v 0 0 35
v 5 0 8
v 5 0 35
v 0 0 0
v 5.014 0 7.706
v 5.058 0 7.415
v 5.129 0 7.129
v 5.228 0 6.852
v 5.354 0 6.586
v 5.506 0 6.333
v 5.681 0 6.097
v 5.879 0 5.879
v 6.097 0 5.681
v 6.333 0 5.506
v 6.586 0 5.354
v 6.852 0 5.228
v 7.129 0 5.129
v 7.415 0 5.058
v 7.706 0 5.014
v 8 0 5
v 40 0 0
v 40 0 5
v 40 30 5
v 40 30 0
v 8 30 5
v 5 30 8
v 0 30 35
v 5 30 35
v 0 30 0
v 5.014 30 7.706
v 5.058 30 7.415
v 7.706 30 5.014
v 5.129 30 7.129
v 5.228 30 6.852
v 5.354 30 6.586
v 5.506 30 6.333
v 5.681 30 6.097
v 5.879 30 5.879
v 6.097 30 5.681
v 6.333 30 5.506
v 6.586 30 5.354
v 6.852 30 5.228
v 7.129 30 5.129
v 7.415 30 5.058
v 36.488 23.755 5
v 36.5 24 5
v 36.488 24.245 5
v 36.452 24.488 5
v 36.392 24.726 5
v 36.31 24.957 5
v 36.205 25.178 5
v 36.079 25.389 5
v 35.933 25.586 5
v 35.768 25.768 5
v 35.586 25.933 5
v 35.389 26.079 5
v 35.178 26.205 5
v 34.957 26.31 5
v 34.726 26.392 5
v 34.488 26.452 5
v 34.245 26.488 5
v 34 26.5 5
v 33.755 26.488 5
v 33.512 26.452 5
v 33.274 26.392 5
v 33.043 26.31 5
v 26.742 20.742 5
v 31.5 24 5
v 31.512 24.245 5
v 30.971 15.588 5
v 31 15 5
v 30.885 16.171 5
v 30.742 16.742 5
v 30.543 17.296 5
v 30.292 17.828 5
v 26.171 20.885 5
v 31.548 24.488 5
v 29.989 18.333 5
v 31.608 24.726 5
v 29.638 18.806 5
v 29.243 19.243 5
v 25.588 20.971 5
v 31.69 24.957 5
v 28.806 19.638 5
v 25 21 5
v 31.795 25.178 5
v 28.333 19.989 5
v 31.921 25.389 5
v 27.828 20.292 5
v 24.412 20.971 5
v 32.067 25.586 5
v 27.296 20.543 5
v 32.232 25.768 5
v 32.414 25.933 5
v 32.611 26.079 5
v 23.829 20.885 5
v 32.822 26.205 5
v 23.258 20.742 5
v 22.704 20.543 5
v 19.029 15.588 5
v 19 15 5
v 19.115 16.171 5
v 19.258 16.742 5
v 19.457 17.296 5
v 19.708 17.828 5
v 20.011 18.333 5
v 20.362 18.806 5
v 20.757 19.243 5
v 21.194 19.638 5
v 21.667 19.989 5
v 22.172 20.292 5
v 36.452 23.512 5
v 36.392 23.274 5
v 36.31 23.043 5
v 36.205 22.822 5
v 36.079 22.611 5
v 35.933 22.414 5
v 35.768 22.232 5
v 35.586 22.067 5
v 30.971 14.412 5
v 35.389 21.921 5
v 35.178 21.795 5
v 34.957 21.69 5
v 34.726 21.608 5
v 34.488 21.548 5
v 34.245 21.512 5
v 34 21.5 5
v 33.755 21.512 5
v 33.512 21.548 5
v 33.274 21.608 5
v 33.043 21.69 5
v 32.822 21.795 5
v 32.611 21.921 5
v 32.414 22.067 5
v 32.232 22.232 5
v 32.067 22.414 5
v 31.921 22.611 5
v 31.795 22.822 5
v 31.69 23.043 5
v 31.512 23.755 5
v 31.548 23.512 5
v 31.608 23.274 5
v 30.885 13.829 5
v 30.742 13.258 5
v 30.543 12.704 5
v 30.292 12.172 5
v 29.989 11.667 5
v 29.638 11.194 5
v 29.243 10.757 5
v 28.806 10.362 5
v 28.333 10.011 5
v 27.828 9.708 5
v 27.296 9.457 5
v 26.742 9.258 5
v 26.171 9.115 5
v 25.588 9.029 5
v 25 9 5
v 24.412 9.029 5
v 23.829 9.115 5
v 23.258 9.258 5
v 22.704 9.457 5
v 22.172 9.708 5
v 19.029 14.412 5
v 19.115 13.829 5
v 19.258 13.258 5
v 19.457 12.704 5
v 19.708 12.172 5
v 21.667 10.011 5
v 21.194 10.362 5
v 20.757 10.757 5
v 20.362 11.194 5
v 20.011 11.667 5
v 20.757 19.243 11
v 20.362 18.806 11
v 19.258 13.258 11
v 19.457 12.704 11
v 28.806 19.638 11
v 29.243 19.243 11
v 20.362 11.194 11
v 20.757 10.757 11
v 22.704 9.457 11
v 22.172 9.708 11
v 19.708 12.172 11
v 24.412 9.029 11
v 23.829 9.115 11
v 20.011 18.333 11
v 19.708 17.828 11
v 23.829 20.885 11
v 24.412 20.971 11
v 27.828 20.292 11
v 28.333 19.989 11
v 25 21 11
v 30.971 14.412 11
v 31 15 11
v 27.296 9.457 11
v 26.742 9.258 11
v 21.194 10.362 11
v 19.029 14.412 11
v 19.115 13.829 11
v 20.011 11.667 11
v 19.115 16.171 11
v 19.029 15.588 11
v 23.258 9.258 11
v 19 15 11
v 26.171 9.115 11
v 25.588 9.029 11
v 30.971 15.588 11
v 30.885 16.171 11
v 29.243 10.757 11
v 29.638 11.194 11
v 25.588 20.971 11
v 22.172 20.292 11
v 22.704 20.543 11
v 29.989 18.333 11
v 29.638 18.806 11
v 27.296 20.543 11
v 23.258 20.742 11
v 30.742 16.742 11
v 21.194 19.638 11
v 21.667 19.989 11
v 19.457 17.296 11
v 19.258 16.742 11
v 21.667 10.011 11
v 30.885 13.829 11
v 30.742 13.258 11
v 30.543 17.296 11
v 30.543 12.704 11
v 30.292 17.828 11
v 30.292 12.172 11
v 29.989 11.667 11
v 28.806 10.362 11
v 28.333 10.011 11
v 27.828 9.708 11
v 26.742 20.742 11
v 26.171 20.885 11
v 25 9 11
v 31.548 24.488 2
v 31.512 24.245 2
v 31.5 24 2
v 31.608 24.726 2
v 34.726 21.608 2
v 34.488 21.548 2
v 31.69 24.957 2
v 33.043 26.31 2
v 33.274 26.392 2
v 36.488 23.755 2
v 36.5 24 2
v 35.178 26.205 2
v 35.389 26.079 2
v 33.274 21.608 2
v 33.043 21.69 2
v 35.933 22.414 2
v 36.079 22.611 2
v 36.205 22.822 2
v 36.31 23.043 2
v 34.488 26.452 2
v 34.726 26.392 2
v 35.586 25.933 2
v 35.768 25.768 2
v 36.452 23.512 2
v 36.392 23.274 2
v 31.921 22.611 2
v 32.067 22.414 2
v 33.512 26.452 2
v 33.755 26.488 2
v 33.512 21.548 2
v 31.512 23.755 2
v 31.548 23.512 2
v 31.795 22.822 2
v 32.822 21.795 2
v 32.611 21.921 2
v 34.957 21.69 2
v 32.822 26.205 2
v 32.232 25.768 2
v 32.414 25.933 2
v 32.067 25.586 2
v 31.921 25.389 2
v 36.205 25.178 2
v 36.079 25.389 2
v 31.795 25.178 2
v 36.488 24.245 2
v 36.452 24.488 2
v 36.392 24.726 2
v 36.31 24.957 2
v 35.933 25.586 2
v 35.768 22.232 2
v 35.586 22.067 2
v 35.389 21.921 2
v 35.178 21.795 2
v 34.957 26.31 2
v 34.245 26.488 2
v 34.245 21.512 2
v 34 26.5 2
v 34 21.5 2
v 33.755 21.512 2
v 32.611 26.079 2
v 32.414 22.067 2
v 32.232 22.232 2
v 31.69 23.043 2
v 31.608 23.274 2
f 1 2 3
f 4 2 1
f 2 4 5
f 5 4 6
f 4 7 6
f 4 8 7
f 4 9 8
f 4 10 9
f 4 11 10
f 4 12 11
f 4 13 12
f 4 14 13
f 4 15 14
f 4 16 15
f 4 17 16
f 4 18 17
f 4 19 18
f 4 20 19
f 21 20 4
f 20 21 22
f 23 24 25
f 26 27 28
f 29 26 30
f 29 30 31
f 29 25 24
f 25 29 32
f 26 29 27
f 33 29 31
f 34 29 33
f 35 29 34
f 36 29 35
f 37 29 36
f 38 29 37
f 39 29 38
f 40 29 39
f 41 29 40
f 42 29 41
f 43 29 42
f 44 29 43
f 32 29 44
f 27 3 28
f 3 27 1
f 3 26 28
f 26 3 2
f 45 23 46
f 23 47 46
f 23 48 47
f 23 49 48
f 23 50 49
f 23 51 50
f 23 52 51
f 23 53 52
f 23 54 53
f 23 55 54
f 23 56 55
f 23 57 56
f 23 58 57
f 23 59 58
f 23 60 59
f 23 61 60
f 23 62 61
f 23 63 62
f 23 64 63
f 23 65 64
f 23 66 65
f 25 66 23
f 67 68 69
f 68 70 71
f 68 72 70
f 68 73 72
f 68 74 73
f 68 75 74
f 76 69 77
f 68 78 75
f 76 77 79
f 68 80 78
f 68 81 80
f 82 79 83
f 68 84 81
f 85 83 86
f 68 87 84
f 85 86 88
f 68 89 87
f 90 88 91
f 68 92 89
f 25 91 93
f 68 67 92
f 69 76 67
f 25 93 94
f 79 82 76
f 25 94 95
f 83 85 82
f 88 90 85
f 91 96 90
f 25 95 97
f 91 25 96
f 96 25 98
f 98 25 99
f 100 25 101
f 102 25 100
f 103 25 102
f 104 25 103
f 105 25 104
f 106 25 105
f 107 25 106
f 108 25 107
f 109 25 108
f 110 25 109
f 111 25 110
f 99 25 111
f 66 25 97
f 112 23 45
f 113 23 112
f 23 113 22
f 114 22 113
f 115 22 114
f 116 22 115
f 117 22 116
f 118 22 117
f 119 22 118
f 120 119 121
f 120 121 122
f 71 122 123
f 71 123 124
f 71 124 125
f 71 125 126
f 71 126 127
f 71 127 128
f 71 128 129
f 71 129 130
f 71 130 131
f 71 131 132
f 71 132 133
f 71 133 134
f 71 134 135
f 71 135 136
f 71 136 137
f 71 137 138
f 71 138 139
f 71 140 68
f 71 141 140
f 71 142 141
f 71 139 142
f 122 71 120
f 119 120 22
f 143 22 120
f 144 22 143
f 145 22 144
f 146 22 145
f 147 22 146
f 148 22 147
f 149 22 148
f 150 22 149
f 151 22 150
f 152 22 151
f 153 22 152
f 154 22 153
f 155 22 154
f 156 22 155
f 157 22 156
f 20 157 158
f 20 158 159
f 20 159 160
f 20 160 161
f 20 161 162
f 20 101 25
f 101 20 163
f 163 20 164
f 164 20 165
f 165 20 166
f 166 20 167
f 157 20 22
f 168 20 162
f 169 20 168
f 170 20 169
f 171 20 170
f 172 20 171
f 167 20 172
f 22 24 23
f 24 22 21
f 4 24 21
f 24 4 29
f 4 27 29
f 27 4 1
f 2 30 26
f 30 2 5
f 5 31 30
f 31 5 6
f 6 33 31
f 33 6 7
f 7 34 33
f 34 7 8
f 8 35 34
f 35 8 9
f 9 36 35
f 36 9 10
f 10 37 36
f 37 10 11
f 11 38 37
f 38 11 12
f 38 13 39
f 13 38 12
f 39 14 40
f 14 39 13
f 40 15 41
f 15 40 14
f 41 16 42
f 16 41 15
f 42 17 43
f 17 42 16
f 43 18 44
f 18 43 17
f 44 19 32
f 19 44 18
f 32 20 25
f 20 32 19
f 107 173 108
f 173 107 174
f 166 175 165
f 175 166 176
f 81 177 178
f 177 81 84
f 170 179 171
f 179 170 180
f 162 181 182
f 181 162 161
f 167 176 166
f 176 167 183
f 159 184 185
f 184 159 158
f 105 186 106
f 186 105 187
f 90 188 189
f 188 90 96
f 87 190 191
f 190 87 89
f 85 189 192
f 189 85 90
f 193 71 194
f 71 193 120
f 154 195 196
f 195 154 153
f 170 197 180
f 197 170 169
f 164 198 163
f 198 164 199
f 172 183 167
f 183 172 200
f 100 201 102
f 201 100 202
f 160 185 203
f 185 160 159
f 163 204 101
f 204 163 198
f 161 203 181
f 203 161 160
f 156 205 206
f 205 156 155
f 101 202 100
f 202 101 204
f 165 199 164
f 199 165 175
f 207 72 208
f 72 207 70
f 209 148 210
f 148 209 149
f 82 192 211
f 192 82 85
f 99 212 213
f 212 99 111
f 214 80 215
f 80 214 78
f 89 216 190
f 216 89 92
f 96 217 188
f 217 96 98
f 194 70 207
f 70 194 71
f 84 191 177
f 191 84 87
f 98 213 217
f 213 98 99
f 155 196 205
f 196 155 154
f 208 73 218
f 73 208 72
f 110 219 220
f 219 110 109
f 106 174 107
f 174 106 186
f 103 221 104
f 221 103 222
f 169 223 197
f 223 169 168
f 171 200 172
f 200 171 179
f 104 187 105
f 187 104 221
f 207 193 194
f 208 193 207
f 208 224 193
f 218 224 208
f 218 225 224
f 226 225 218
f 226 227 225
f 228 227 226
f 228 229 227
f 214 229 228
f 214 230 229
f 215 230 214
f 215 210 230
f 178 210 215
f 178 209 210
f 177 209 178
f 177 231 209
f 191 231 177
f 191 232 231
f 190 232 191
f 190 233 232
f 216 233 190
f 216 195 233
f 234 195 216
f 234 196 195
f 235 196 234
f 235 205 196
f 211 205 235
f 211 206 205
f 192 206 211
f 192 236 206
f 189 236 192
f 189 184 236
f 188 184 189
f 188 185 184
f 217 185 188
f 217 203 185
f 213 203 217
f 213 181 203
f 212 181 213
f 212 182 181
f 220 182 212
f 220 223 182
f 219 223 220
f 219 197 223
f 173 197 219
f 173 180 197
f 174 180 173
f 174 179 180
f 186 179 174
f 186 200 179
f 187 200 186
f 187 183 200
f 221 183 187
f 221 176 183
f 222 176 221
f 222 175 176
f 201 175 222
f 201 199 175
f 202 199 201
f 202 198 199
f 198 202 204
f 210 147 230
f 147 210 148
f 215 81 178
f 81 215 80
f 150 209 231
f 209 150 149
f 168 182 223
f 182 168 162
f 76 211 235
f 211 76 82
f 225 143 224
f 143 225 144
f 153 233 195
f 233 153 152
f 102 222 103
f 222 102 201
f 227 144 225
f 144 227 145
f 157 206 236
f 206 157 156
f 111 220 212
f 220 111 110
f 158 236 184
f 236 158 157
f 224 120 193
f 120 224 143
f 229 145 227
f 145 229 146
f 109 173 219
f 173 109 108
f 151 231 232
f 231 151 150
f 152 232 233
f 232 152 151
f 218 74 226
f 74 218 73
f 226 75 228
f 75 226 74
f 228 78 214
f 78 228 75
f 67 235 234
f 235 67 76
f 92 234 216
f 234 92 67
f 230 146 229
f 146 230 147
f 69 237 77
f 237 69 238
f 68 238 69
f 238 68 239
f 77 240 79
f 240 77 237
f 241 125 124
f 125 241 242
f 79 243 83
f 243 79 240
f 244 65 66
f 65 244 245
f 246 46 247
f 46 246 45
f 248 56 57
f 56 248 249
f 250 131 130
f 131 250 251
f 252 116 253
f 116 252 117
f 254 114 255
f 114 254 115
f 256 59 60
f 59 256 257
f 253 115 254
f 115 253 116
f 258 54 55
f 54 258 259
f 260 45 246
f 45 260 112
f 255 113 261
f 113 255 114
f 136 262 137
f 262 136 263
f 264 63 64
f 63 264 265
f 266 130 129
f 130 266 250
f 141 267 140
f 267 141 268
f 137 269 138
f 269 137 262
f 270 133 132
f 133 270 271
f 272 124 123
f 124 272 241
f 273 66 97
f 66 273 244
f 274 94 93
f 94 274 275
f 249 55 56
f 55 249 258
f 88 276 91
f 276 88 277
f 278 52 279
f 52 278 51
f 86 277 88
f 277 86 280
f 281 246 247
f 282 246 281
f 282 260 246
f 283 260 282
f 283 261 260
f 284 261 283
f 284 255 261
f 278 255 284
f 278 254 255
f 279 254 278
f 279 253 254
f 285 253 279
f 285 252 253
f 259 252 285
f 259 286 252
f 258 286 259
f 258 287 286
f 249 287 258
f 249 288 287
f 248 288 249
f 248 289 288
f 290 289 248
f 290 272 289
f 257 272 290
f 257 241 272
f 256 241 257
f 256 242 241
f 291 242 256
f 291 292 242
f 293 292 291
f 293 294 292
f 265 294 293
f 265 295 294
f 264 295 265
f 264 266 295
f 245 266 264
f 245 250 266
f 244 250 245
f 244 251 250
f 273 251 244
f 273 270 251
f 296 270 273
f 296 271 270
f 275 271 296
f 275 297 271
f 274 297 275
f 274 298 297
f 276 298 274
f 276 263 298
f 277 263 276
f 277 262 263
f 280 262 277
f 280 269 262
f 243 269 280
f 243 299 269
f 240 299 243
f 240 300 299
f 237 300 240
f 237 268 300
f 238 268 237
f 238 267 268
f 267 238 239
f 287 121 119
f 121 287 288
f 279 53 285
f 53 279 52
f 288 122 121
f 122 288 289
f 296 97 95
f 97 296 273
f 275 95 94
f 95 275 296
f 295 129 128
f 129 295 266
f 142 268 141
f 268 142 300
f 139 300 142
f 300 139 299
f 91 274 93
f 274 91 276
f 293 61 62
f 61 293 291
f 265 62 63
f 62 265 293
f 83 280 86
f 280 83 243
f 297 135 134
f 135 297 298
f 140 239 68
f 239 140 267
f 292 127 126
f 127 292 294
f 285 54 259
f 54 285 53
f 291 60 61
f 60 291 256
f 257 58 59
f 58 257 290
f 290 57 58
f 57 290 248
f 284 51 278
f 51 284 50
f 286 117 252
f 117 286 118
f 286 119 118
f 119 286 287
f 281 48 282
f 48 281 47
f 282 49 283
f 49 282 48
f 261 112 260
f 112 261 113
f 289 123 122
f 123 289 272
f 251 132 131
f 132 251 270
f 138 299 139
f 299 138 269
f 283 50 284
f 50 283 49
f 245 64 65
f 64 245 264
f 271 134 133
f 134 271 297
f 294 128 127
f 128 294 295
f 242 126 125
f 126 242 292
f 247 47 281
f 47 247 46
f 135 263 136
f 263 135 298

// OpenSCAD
// Source: OpenSCAD_Model
// Gate limit: 0.0610327780787 mm; measured Hausdorff: 0.00000000013728103759 mm
// Before snapping Hausdorff: 0.000002826492865 mm
// How to edit: change Customizer parameters; host expressions move attached features.
// Assertions stop edits that violate linked dimensions. Distances are in mm.
/* [Body] */
// body width (raw 40)
body_width = 40; // [0.01:0.01:80]
// body height (raw 35)
body_height = 35; // [0.01:0.01:70]
// body depth (raw 30)
body_depth = 30; // [0.01:0.01:60]
// base thickness (raw 5)
base_thickness = 5; // [0.01:0.01:35]
// wall thickness (raw 5)
wall_thickness = 5; // [0.01:0.01:40]
/* [Fillet 1] */
// fillet 1 radius (raw 3.00000029096)
fillet_1_radius = 3; // [0.01:0.01:30]
/* [Boss 1] */
// boss 1 radius (raw 6.00000004198)
boss_1_radius = 6; // [0.01:0.01:14.99]
// boss 1 x (raw 15)
boss_1_x = 15; // [0:0.01:40]
// boss 1 z (raw 15.0000000972)
boss_1_z = 15; // [0:0.01:30]
// boss 1 height (raw 6)
boss_1_height = 6; // [0.01:0.01:40]
/* [Blind Hole 1] */
// blind hole 1 radius (raw 2.50000015651)
blind_hole_1_radius = 2.5; // [0.01:0.01:5.99]
// blind hole 1 x (raw 6.00000024015)
blind_hole_1_x = 6; // [0:0.01:40]
// blind hole 1 z (raw 24)
blind_hole_1_z = 24; // [0:0.01:30]
// blind hole 1 depth (raw 3)
blind_hole_1_depth = 3; // [0.01:0.01:4.99]
/* [Hidden] */
$fn = 64;
_join_epsilon = max(body_width, body_depth)*0.000001;
assert(base_thickness < body_height && wall_thickness < body_width, "Body legs must have positive free lengths");
assert(fillet_1_radius < body_width-wall_thickness && fillet_1_radius < body_height-base_thickness, "Fillet must fit between the free leg ends");
assert(boss_1_x > boss_1_radius && boss_1_x+boss_1_radius < body_width && boss_1_z > boss_1_radius && boss_1_z+boss_1_radius < body_depth, "Cylinder must stay inside the host footprint");
assert(boss_1_x+boss_1_radius+fillet_1_radius < body_width-wall_thickness, "Cylinder must clear the wall");
assert(blind_hole_1_depth < base_thickness, "Blind hole must leave a floor");
assert(blind_hole_1_x > blind_hole_1_radius && blind_hole_1_x+blind_hole_1_radius < body_width && blind_hole_1_z > blind_hole_1_radius && blind_hole_1_z+blind_hole_1_radius < body_depth, "Cylinder must stay inside the host footprint");
assert(blind_hole_1_x+blind_hole_1_radius+fillet_1_radius < body_width-wall_thickness, "Cylinder must clear the wall");
assert(body_width > 0 && body_height > 0 && body_depth > 0 && base_thickness > 0 && wall_thickness > 0 && fillet_1_radius > 0 && boss_1_radius > 0 && boss_1_height > 0 && blind_hole_1_radius > 0 && blind_hole_1_depth > 0, "Dimensions must stay positive");
assert(norm([boss_1_x-blind_hole_1_x, boss_1_z-blind_hole_1_z]) > boss_1_radius+blind_hole_1_radius, "Features on one host must not overlap");
multmatrix([[-1, 0, 0, 40], [0, 0, 1, 0], [0, 1, 0, 0], [0, 0, 0, 1]])
difference() {
  union() {
    // face F0 body_1_boundary (plane)
    // face F1 body_1_boundary (plane)
    // face F3 body_1_boundary (plane)
    // face F4 base_top (plane)
    // face F5 body_1_boundary (plane)
    // face F6 body_1_boundary (plane)
    // face F7 body_1_boundary (plane)
    // face F8 body_1_boundary (plane)
    // P0 = [0, 0]
    // P1 = [body_width, 0]
    // P2 = [body_width, body_height]
    // P3 = [body_width-wall_thickness, body_height]
    // P4 = [body_width-wall_thickness, base_thickness]
    // P5 = [0, base_thickness]
    linear_extrude(height=body_depth) polygon(points=[[0, 0], [body_width, 0], [body_width, body_height], [body_width-wall_thickness, body_height], [body_width-wall_thickness, base_thickness], [0, base_thickness]]);
    // face F2 fillet_1 (cylinder)
    linear_extrude(height=body_depth) difference() {
      polygon(points=[[(body_width-wall_thickness)+sign((body_width-wall_thickness)-(body_width-wall_thickness-fillet_1_radius))*_join_epsilon, (base_thickness)+sign((base_thickness)-(base_thickness+fillet_1_radius))*_join_epsilon], [body_width-wall_thickness-fillet_1_radius, (base_thickness)+sign((base_thickness)-(base_thickness+fillet_1_radius))*_join_epsilon], [body_width-wall_thickness-fillet_1_radius, base_thickness+fillet_1_radius], [(body_width-wall_thickness)+sign((body_width-wall_thickness)-(body_width-wall_thickness-fillet_1_radius))*_join_epsilon, base_thickness+fillet_1_radius]]);
      translate([body_width-wall_thickness-fillet_1_radius, base_thickness+fillet_1_radius]) circle(r=fillet_1_radius);
    }
    // face F9 boss_1_side (cylinder)
    // face F10 boss_1_cap (plane)
    translate([boss_1_x, (base_thickness)-(1)*_join_epsilon, boss_1_z]) rotate(a=90, v=[-1, 0, 0]) cylinder(r=boss_1_radius, h=boss_1_height+_join_epsilon);
  }
  // face F11 blind_hole_1_side (cylinder)
  // face F12 blind_hole_1_floor (plane)
  translate([blind_hole_1_x, (base_thickness)-(-1)*_join_epsilon, blind_hole_1_z]) rotate(a=90, v=[1, 0, 0]) cylinder(r=blind_hole_1_radius, h=blind_hole_1_depth+_join_epsilon);
}
